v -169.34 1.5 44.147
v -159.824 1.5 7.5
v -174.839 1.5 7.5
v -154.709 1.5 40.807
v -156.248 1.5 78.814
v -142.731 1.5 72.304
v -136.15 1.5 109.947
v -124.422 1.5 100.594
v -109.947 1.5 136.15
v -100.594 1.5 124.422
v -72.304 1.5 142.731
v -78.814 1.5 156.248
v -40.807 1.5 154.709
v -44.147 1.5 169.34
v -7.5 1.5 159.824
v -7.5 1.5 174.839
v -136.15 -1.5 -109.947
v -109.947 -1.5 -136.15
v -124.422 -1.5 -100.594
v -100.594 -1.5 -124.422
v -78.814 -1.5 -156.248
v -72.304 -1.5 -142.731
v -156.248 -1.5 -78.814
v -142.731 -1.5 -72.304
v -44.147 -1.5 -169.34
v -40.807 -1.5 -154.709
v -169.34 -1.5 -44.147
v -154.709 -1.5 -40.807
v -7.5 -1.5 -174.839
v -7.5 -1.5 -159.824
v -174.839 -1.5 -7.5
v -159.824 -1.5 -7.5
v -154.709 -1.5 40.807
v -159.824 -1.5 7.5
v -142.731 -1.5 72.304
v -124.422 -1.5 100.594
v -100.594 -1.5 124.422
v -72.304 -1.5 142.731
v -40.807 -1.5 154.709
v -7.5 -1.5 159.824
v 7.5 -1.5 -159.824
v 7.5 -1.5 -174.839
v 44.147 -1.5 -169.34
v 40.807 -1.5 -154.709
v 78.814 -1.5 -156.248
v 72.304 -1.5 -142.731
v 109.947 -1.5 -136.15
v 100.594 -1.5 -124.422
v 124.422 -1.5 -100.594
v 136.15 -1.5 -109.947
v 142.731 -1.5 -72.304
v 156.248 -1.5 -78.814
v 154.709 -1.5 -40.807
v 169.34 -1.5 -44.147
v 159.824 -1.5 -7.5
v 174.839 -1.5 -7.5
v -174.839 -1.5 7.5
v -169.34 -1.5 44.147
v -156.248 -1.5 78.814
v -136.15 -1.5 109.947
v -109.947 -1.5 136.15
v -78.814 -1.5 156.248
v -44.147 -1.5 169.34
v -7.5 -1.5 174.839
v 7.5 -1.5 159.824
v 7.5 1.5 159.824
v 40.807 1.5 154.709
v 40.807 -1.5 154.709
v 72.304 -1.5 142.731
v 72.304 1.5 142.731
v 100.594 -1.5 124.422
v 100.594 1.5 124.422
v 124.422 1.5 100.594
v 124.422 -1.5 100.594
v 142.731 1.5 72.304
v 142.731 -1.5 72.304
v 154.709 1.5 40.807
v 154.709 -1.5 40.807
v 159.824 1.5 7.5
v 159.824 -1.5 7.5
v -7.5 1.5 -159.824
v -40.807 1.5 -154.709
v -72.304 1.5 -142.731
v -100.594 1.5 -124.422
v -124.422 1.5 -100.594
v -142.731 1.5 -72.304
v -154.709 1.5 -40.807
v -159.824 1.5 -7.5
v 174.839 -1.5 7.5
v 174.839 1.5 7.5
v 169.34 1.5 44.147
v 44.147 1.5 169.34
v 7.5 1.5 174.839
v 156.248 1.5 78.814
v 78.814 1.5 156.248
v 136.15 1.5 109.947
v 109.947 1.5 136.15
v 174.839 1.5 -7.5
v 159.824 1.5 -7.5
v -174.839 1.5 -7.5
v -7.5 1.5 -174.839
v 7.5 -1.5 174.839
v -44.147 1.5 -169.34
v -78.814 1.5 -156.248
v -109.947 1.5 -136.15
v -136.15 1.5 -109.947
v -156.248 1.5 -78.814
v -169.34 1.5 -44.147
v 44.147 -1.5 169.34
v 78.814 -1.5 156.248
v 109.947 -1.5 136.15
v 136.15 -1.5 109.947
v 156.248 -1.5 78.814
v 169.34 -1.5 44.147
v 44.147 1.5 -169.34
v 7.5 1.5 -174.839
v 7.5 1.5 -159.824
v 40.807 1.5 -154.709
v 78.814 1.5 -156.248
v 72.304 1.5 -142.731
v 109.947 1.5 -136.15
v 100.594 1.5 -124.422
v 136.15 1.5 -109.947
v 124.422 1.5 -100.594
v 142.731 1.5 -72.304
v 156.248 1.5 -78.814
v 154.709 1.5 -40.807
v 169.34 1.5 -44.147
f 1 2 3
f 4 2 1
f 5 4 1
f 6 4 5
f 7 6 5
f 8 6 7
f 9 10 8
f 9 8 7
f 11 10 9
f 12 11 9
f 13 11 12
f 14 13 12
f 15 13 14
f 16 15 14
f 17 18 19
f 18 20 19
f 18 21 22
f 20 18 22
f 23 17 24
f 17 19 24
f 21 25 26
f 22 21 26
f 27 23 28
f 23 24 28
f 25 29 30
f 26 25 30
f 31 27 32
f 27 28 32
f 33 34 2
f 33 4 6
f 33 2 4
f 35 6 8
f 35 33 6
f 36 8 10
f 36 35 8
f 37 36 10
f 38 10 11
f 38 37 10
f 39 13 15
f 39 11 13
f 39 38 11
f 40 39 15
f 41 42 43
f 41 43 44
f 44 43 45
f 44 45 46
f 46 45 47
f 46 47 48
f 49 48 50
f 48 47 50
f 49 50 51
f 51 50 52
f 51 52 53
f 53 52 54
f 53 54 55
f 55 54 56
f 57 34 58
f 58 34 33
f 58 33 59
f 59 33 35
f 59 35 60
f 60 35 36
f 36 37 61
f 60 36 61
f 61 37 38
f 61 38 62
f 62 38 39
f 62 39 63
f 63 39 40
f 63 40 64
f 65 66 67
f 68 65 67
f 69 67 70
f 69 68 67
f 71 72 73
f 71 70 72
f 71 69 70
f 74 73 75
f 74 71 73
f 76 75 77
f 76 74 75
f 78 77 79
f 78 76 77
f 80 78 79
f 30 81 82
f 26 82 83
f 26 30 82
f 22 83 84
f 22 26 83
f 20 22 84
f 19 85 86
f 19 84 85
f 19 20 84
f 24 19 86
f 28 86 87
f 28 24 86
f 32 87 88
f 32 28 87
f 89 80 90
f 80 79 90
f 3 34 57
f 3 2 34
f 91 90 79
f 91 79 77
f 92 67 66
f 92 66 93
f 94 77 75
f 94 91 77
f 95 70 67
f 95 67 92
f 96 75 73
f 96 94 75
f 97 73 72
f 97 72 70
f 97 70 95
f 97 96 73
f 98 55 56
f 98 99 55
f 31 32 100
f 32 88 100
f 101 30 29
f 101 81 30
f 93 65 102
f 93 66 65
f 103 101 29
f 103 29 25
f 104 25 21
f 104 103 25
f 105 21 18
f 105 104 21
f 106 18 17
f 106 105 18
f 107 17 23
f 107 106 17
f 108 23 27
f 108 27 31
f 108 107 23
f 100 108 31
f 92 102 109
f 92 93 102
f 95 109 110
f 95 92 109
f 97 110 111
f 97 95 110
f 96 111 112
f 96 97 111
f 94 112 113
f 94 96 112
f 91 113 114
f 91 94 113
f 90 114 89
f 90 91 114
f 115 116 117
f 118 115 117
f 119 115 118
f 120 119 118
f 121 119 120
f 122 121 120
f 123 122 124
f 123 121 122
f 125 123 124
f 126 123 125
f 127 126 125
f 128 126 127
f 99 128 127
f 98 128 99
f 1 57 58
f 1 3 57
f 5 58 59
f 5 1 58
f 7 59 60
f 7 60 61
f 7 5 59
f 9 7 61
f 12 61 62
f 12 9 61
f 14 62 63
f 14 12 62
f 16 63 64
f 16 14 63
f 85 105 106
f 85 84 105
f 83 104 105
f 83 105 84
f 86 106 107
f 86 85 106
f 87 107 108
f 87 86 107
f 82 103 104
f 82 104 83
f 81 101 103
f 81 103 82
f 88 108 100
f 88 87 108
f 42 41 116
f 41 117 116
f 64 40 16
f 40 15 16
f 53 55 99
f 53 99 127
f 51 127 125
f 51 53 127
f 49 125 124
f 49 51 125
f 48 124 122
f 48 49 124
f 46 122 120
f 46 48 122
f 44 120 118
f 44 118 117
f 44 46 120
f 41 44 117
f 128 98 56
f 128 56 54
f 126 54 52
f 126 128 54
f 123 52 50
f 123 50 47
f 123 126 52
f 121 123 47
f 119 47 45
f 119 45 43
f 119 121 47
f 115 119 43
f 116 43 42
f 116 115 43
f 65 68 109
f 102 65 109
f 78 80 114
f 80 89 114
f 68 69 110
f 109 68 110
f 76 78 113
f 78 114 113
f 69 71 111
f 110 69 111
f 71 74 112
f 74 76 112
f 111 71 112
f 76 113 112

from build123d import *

# Parameters (mm, degrees)
SKETCH1_R           = 175
SKETCH1_R_2         = 160
BOSS_EXTRUDE1_DEPTH = 1.5
SKETCH2_W           = 32.609126468
SKETCH2_H           = 15
AXIS_GAP_DEPTH      = 248.49191906
CIRPATTERN1_COUNT   = 4


with BuildPart() as part:
    # Sketch1 → Boss-Extrude1 (new, symmetric)
    with BuildSketch(Plane(origin=(0, 0, 0), x_dir=(1, 0, 0), z_dir=(0, 1, 0))):
        with Locations(Location((0, 0, 0), (0, 0, 270))):
            Circle(SKETCH1_R)
        with Locations(Location((0, 0, 0), (0, 0, 270))):
            Circle(SKETCH1_R_2, mode=Mode.SUBTRACT)
    extrude(amount=BOSS_EXTRUDE1_DEPTH, both=True)

    # Sketch2 → axis gap (cut, symmetric)
    with BuildSketch(Plane(origin=(0, 0, 0), x_dir=(1, 0, 0), z_dir=(0, 1, 0))):
        with Locations((167.5, 0)):
            Rectangle(SKETCH2_W, SKETCH2_H)
    axis_gap = extrude(amount=AXIS_GAP_DEPTH, both=True, mode=Mode.SUBTRACT)

    # CirPattern1: axis gap ×4 about axis
    cirpattern1_axis = Axis((0, 0, 0), (0, 1, 0))
    for i in range(1, CIRPATTERN1_COUNT):
        add(axis_gap.rotate(cirpattern1_axis, i * 360 / CIRPATTERN1_COUNT), mode=Mode.SUBTRACT)


solid = part.part
